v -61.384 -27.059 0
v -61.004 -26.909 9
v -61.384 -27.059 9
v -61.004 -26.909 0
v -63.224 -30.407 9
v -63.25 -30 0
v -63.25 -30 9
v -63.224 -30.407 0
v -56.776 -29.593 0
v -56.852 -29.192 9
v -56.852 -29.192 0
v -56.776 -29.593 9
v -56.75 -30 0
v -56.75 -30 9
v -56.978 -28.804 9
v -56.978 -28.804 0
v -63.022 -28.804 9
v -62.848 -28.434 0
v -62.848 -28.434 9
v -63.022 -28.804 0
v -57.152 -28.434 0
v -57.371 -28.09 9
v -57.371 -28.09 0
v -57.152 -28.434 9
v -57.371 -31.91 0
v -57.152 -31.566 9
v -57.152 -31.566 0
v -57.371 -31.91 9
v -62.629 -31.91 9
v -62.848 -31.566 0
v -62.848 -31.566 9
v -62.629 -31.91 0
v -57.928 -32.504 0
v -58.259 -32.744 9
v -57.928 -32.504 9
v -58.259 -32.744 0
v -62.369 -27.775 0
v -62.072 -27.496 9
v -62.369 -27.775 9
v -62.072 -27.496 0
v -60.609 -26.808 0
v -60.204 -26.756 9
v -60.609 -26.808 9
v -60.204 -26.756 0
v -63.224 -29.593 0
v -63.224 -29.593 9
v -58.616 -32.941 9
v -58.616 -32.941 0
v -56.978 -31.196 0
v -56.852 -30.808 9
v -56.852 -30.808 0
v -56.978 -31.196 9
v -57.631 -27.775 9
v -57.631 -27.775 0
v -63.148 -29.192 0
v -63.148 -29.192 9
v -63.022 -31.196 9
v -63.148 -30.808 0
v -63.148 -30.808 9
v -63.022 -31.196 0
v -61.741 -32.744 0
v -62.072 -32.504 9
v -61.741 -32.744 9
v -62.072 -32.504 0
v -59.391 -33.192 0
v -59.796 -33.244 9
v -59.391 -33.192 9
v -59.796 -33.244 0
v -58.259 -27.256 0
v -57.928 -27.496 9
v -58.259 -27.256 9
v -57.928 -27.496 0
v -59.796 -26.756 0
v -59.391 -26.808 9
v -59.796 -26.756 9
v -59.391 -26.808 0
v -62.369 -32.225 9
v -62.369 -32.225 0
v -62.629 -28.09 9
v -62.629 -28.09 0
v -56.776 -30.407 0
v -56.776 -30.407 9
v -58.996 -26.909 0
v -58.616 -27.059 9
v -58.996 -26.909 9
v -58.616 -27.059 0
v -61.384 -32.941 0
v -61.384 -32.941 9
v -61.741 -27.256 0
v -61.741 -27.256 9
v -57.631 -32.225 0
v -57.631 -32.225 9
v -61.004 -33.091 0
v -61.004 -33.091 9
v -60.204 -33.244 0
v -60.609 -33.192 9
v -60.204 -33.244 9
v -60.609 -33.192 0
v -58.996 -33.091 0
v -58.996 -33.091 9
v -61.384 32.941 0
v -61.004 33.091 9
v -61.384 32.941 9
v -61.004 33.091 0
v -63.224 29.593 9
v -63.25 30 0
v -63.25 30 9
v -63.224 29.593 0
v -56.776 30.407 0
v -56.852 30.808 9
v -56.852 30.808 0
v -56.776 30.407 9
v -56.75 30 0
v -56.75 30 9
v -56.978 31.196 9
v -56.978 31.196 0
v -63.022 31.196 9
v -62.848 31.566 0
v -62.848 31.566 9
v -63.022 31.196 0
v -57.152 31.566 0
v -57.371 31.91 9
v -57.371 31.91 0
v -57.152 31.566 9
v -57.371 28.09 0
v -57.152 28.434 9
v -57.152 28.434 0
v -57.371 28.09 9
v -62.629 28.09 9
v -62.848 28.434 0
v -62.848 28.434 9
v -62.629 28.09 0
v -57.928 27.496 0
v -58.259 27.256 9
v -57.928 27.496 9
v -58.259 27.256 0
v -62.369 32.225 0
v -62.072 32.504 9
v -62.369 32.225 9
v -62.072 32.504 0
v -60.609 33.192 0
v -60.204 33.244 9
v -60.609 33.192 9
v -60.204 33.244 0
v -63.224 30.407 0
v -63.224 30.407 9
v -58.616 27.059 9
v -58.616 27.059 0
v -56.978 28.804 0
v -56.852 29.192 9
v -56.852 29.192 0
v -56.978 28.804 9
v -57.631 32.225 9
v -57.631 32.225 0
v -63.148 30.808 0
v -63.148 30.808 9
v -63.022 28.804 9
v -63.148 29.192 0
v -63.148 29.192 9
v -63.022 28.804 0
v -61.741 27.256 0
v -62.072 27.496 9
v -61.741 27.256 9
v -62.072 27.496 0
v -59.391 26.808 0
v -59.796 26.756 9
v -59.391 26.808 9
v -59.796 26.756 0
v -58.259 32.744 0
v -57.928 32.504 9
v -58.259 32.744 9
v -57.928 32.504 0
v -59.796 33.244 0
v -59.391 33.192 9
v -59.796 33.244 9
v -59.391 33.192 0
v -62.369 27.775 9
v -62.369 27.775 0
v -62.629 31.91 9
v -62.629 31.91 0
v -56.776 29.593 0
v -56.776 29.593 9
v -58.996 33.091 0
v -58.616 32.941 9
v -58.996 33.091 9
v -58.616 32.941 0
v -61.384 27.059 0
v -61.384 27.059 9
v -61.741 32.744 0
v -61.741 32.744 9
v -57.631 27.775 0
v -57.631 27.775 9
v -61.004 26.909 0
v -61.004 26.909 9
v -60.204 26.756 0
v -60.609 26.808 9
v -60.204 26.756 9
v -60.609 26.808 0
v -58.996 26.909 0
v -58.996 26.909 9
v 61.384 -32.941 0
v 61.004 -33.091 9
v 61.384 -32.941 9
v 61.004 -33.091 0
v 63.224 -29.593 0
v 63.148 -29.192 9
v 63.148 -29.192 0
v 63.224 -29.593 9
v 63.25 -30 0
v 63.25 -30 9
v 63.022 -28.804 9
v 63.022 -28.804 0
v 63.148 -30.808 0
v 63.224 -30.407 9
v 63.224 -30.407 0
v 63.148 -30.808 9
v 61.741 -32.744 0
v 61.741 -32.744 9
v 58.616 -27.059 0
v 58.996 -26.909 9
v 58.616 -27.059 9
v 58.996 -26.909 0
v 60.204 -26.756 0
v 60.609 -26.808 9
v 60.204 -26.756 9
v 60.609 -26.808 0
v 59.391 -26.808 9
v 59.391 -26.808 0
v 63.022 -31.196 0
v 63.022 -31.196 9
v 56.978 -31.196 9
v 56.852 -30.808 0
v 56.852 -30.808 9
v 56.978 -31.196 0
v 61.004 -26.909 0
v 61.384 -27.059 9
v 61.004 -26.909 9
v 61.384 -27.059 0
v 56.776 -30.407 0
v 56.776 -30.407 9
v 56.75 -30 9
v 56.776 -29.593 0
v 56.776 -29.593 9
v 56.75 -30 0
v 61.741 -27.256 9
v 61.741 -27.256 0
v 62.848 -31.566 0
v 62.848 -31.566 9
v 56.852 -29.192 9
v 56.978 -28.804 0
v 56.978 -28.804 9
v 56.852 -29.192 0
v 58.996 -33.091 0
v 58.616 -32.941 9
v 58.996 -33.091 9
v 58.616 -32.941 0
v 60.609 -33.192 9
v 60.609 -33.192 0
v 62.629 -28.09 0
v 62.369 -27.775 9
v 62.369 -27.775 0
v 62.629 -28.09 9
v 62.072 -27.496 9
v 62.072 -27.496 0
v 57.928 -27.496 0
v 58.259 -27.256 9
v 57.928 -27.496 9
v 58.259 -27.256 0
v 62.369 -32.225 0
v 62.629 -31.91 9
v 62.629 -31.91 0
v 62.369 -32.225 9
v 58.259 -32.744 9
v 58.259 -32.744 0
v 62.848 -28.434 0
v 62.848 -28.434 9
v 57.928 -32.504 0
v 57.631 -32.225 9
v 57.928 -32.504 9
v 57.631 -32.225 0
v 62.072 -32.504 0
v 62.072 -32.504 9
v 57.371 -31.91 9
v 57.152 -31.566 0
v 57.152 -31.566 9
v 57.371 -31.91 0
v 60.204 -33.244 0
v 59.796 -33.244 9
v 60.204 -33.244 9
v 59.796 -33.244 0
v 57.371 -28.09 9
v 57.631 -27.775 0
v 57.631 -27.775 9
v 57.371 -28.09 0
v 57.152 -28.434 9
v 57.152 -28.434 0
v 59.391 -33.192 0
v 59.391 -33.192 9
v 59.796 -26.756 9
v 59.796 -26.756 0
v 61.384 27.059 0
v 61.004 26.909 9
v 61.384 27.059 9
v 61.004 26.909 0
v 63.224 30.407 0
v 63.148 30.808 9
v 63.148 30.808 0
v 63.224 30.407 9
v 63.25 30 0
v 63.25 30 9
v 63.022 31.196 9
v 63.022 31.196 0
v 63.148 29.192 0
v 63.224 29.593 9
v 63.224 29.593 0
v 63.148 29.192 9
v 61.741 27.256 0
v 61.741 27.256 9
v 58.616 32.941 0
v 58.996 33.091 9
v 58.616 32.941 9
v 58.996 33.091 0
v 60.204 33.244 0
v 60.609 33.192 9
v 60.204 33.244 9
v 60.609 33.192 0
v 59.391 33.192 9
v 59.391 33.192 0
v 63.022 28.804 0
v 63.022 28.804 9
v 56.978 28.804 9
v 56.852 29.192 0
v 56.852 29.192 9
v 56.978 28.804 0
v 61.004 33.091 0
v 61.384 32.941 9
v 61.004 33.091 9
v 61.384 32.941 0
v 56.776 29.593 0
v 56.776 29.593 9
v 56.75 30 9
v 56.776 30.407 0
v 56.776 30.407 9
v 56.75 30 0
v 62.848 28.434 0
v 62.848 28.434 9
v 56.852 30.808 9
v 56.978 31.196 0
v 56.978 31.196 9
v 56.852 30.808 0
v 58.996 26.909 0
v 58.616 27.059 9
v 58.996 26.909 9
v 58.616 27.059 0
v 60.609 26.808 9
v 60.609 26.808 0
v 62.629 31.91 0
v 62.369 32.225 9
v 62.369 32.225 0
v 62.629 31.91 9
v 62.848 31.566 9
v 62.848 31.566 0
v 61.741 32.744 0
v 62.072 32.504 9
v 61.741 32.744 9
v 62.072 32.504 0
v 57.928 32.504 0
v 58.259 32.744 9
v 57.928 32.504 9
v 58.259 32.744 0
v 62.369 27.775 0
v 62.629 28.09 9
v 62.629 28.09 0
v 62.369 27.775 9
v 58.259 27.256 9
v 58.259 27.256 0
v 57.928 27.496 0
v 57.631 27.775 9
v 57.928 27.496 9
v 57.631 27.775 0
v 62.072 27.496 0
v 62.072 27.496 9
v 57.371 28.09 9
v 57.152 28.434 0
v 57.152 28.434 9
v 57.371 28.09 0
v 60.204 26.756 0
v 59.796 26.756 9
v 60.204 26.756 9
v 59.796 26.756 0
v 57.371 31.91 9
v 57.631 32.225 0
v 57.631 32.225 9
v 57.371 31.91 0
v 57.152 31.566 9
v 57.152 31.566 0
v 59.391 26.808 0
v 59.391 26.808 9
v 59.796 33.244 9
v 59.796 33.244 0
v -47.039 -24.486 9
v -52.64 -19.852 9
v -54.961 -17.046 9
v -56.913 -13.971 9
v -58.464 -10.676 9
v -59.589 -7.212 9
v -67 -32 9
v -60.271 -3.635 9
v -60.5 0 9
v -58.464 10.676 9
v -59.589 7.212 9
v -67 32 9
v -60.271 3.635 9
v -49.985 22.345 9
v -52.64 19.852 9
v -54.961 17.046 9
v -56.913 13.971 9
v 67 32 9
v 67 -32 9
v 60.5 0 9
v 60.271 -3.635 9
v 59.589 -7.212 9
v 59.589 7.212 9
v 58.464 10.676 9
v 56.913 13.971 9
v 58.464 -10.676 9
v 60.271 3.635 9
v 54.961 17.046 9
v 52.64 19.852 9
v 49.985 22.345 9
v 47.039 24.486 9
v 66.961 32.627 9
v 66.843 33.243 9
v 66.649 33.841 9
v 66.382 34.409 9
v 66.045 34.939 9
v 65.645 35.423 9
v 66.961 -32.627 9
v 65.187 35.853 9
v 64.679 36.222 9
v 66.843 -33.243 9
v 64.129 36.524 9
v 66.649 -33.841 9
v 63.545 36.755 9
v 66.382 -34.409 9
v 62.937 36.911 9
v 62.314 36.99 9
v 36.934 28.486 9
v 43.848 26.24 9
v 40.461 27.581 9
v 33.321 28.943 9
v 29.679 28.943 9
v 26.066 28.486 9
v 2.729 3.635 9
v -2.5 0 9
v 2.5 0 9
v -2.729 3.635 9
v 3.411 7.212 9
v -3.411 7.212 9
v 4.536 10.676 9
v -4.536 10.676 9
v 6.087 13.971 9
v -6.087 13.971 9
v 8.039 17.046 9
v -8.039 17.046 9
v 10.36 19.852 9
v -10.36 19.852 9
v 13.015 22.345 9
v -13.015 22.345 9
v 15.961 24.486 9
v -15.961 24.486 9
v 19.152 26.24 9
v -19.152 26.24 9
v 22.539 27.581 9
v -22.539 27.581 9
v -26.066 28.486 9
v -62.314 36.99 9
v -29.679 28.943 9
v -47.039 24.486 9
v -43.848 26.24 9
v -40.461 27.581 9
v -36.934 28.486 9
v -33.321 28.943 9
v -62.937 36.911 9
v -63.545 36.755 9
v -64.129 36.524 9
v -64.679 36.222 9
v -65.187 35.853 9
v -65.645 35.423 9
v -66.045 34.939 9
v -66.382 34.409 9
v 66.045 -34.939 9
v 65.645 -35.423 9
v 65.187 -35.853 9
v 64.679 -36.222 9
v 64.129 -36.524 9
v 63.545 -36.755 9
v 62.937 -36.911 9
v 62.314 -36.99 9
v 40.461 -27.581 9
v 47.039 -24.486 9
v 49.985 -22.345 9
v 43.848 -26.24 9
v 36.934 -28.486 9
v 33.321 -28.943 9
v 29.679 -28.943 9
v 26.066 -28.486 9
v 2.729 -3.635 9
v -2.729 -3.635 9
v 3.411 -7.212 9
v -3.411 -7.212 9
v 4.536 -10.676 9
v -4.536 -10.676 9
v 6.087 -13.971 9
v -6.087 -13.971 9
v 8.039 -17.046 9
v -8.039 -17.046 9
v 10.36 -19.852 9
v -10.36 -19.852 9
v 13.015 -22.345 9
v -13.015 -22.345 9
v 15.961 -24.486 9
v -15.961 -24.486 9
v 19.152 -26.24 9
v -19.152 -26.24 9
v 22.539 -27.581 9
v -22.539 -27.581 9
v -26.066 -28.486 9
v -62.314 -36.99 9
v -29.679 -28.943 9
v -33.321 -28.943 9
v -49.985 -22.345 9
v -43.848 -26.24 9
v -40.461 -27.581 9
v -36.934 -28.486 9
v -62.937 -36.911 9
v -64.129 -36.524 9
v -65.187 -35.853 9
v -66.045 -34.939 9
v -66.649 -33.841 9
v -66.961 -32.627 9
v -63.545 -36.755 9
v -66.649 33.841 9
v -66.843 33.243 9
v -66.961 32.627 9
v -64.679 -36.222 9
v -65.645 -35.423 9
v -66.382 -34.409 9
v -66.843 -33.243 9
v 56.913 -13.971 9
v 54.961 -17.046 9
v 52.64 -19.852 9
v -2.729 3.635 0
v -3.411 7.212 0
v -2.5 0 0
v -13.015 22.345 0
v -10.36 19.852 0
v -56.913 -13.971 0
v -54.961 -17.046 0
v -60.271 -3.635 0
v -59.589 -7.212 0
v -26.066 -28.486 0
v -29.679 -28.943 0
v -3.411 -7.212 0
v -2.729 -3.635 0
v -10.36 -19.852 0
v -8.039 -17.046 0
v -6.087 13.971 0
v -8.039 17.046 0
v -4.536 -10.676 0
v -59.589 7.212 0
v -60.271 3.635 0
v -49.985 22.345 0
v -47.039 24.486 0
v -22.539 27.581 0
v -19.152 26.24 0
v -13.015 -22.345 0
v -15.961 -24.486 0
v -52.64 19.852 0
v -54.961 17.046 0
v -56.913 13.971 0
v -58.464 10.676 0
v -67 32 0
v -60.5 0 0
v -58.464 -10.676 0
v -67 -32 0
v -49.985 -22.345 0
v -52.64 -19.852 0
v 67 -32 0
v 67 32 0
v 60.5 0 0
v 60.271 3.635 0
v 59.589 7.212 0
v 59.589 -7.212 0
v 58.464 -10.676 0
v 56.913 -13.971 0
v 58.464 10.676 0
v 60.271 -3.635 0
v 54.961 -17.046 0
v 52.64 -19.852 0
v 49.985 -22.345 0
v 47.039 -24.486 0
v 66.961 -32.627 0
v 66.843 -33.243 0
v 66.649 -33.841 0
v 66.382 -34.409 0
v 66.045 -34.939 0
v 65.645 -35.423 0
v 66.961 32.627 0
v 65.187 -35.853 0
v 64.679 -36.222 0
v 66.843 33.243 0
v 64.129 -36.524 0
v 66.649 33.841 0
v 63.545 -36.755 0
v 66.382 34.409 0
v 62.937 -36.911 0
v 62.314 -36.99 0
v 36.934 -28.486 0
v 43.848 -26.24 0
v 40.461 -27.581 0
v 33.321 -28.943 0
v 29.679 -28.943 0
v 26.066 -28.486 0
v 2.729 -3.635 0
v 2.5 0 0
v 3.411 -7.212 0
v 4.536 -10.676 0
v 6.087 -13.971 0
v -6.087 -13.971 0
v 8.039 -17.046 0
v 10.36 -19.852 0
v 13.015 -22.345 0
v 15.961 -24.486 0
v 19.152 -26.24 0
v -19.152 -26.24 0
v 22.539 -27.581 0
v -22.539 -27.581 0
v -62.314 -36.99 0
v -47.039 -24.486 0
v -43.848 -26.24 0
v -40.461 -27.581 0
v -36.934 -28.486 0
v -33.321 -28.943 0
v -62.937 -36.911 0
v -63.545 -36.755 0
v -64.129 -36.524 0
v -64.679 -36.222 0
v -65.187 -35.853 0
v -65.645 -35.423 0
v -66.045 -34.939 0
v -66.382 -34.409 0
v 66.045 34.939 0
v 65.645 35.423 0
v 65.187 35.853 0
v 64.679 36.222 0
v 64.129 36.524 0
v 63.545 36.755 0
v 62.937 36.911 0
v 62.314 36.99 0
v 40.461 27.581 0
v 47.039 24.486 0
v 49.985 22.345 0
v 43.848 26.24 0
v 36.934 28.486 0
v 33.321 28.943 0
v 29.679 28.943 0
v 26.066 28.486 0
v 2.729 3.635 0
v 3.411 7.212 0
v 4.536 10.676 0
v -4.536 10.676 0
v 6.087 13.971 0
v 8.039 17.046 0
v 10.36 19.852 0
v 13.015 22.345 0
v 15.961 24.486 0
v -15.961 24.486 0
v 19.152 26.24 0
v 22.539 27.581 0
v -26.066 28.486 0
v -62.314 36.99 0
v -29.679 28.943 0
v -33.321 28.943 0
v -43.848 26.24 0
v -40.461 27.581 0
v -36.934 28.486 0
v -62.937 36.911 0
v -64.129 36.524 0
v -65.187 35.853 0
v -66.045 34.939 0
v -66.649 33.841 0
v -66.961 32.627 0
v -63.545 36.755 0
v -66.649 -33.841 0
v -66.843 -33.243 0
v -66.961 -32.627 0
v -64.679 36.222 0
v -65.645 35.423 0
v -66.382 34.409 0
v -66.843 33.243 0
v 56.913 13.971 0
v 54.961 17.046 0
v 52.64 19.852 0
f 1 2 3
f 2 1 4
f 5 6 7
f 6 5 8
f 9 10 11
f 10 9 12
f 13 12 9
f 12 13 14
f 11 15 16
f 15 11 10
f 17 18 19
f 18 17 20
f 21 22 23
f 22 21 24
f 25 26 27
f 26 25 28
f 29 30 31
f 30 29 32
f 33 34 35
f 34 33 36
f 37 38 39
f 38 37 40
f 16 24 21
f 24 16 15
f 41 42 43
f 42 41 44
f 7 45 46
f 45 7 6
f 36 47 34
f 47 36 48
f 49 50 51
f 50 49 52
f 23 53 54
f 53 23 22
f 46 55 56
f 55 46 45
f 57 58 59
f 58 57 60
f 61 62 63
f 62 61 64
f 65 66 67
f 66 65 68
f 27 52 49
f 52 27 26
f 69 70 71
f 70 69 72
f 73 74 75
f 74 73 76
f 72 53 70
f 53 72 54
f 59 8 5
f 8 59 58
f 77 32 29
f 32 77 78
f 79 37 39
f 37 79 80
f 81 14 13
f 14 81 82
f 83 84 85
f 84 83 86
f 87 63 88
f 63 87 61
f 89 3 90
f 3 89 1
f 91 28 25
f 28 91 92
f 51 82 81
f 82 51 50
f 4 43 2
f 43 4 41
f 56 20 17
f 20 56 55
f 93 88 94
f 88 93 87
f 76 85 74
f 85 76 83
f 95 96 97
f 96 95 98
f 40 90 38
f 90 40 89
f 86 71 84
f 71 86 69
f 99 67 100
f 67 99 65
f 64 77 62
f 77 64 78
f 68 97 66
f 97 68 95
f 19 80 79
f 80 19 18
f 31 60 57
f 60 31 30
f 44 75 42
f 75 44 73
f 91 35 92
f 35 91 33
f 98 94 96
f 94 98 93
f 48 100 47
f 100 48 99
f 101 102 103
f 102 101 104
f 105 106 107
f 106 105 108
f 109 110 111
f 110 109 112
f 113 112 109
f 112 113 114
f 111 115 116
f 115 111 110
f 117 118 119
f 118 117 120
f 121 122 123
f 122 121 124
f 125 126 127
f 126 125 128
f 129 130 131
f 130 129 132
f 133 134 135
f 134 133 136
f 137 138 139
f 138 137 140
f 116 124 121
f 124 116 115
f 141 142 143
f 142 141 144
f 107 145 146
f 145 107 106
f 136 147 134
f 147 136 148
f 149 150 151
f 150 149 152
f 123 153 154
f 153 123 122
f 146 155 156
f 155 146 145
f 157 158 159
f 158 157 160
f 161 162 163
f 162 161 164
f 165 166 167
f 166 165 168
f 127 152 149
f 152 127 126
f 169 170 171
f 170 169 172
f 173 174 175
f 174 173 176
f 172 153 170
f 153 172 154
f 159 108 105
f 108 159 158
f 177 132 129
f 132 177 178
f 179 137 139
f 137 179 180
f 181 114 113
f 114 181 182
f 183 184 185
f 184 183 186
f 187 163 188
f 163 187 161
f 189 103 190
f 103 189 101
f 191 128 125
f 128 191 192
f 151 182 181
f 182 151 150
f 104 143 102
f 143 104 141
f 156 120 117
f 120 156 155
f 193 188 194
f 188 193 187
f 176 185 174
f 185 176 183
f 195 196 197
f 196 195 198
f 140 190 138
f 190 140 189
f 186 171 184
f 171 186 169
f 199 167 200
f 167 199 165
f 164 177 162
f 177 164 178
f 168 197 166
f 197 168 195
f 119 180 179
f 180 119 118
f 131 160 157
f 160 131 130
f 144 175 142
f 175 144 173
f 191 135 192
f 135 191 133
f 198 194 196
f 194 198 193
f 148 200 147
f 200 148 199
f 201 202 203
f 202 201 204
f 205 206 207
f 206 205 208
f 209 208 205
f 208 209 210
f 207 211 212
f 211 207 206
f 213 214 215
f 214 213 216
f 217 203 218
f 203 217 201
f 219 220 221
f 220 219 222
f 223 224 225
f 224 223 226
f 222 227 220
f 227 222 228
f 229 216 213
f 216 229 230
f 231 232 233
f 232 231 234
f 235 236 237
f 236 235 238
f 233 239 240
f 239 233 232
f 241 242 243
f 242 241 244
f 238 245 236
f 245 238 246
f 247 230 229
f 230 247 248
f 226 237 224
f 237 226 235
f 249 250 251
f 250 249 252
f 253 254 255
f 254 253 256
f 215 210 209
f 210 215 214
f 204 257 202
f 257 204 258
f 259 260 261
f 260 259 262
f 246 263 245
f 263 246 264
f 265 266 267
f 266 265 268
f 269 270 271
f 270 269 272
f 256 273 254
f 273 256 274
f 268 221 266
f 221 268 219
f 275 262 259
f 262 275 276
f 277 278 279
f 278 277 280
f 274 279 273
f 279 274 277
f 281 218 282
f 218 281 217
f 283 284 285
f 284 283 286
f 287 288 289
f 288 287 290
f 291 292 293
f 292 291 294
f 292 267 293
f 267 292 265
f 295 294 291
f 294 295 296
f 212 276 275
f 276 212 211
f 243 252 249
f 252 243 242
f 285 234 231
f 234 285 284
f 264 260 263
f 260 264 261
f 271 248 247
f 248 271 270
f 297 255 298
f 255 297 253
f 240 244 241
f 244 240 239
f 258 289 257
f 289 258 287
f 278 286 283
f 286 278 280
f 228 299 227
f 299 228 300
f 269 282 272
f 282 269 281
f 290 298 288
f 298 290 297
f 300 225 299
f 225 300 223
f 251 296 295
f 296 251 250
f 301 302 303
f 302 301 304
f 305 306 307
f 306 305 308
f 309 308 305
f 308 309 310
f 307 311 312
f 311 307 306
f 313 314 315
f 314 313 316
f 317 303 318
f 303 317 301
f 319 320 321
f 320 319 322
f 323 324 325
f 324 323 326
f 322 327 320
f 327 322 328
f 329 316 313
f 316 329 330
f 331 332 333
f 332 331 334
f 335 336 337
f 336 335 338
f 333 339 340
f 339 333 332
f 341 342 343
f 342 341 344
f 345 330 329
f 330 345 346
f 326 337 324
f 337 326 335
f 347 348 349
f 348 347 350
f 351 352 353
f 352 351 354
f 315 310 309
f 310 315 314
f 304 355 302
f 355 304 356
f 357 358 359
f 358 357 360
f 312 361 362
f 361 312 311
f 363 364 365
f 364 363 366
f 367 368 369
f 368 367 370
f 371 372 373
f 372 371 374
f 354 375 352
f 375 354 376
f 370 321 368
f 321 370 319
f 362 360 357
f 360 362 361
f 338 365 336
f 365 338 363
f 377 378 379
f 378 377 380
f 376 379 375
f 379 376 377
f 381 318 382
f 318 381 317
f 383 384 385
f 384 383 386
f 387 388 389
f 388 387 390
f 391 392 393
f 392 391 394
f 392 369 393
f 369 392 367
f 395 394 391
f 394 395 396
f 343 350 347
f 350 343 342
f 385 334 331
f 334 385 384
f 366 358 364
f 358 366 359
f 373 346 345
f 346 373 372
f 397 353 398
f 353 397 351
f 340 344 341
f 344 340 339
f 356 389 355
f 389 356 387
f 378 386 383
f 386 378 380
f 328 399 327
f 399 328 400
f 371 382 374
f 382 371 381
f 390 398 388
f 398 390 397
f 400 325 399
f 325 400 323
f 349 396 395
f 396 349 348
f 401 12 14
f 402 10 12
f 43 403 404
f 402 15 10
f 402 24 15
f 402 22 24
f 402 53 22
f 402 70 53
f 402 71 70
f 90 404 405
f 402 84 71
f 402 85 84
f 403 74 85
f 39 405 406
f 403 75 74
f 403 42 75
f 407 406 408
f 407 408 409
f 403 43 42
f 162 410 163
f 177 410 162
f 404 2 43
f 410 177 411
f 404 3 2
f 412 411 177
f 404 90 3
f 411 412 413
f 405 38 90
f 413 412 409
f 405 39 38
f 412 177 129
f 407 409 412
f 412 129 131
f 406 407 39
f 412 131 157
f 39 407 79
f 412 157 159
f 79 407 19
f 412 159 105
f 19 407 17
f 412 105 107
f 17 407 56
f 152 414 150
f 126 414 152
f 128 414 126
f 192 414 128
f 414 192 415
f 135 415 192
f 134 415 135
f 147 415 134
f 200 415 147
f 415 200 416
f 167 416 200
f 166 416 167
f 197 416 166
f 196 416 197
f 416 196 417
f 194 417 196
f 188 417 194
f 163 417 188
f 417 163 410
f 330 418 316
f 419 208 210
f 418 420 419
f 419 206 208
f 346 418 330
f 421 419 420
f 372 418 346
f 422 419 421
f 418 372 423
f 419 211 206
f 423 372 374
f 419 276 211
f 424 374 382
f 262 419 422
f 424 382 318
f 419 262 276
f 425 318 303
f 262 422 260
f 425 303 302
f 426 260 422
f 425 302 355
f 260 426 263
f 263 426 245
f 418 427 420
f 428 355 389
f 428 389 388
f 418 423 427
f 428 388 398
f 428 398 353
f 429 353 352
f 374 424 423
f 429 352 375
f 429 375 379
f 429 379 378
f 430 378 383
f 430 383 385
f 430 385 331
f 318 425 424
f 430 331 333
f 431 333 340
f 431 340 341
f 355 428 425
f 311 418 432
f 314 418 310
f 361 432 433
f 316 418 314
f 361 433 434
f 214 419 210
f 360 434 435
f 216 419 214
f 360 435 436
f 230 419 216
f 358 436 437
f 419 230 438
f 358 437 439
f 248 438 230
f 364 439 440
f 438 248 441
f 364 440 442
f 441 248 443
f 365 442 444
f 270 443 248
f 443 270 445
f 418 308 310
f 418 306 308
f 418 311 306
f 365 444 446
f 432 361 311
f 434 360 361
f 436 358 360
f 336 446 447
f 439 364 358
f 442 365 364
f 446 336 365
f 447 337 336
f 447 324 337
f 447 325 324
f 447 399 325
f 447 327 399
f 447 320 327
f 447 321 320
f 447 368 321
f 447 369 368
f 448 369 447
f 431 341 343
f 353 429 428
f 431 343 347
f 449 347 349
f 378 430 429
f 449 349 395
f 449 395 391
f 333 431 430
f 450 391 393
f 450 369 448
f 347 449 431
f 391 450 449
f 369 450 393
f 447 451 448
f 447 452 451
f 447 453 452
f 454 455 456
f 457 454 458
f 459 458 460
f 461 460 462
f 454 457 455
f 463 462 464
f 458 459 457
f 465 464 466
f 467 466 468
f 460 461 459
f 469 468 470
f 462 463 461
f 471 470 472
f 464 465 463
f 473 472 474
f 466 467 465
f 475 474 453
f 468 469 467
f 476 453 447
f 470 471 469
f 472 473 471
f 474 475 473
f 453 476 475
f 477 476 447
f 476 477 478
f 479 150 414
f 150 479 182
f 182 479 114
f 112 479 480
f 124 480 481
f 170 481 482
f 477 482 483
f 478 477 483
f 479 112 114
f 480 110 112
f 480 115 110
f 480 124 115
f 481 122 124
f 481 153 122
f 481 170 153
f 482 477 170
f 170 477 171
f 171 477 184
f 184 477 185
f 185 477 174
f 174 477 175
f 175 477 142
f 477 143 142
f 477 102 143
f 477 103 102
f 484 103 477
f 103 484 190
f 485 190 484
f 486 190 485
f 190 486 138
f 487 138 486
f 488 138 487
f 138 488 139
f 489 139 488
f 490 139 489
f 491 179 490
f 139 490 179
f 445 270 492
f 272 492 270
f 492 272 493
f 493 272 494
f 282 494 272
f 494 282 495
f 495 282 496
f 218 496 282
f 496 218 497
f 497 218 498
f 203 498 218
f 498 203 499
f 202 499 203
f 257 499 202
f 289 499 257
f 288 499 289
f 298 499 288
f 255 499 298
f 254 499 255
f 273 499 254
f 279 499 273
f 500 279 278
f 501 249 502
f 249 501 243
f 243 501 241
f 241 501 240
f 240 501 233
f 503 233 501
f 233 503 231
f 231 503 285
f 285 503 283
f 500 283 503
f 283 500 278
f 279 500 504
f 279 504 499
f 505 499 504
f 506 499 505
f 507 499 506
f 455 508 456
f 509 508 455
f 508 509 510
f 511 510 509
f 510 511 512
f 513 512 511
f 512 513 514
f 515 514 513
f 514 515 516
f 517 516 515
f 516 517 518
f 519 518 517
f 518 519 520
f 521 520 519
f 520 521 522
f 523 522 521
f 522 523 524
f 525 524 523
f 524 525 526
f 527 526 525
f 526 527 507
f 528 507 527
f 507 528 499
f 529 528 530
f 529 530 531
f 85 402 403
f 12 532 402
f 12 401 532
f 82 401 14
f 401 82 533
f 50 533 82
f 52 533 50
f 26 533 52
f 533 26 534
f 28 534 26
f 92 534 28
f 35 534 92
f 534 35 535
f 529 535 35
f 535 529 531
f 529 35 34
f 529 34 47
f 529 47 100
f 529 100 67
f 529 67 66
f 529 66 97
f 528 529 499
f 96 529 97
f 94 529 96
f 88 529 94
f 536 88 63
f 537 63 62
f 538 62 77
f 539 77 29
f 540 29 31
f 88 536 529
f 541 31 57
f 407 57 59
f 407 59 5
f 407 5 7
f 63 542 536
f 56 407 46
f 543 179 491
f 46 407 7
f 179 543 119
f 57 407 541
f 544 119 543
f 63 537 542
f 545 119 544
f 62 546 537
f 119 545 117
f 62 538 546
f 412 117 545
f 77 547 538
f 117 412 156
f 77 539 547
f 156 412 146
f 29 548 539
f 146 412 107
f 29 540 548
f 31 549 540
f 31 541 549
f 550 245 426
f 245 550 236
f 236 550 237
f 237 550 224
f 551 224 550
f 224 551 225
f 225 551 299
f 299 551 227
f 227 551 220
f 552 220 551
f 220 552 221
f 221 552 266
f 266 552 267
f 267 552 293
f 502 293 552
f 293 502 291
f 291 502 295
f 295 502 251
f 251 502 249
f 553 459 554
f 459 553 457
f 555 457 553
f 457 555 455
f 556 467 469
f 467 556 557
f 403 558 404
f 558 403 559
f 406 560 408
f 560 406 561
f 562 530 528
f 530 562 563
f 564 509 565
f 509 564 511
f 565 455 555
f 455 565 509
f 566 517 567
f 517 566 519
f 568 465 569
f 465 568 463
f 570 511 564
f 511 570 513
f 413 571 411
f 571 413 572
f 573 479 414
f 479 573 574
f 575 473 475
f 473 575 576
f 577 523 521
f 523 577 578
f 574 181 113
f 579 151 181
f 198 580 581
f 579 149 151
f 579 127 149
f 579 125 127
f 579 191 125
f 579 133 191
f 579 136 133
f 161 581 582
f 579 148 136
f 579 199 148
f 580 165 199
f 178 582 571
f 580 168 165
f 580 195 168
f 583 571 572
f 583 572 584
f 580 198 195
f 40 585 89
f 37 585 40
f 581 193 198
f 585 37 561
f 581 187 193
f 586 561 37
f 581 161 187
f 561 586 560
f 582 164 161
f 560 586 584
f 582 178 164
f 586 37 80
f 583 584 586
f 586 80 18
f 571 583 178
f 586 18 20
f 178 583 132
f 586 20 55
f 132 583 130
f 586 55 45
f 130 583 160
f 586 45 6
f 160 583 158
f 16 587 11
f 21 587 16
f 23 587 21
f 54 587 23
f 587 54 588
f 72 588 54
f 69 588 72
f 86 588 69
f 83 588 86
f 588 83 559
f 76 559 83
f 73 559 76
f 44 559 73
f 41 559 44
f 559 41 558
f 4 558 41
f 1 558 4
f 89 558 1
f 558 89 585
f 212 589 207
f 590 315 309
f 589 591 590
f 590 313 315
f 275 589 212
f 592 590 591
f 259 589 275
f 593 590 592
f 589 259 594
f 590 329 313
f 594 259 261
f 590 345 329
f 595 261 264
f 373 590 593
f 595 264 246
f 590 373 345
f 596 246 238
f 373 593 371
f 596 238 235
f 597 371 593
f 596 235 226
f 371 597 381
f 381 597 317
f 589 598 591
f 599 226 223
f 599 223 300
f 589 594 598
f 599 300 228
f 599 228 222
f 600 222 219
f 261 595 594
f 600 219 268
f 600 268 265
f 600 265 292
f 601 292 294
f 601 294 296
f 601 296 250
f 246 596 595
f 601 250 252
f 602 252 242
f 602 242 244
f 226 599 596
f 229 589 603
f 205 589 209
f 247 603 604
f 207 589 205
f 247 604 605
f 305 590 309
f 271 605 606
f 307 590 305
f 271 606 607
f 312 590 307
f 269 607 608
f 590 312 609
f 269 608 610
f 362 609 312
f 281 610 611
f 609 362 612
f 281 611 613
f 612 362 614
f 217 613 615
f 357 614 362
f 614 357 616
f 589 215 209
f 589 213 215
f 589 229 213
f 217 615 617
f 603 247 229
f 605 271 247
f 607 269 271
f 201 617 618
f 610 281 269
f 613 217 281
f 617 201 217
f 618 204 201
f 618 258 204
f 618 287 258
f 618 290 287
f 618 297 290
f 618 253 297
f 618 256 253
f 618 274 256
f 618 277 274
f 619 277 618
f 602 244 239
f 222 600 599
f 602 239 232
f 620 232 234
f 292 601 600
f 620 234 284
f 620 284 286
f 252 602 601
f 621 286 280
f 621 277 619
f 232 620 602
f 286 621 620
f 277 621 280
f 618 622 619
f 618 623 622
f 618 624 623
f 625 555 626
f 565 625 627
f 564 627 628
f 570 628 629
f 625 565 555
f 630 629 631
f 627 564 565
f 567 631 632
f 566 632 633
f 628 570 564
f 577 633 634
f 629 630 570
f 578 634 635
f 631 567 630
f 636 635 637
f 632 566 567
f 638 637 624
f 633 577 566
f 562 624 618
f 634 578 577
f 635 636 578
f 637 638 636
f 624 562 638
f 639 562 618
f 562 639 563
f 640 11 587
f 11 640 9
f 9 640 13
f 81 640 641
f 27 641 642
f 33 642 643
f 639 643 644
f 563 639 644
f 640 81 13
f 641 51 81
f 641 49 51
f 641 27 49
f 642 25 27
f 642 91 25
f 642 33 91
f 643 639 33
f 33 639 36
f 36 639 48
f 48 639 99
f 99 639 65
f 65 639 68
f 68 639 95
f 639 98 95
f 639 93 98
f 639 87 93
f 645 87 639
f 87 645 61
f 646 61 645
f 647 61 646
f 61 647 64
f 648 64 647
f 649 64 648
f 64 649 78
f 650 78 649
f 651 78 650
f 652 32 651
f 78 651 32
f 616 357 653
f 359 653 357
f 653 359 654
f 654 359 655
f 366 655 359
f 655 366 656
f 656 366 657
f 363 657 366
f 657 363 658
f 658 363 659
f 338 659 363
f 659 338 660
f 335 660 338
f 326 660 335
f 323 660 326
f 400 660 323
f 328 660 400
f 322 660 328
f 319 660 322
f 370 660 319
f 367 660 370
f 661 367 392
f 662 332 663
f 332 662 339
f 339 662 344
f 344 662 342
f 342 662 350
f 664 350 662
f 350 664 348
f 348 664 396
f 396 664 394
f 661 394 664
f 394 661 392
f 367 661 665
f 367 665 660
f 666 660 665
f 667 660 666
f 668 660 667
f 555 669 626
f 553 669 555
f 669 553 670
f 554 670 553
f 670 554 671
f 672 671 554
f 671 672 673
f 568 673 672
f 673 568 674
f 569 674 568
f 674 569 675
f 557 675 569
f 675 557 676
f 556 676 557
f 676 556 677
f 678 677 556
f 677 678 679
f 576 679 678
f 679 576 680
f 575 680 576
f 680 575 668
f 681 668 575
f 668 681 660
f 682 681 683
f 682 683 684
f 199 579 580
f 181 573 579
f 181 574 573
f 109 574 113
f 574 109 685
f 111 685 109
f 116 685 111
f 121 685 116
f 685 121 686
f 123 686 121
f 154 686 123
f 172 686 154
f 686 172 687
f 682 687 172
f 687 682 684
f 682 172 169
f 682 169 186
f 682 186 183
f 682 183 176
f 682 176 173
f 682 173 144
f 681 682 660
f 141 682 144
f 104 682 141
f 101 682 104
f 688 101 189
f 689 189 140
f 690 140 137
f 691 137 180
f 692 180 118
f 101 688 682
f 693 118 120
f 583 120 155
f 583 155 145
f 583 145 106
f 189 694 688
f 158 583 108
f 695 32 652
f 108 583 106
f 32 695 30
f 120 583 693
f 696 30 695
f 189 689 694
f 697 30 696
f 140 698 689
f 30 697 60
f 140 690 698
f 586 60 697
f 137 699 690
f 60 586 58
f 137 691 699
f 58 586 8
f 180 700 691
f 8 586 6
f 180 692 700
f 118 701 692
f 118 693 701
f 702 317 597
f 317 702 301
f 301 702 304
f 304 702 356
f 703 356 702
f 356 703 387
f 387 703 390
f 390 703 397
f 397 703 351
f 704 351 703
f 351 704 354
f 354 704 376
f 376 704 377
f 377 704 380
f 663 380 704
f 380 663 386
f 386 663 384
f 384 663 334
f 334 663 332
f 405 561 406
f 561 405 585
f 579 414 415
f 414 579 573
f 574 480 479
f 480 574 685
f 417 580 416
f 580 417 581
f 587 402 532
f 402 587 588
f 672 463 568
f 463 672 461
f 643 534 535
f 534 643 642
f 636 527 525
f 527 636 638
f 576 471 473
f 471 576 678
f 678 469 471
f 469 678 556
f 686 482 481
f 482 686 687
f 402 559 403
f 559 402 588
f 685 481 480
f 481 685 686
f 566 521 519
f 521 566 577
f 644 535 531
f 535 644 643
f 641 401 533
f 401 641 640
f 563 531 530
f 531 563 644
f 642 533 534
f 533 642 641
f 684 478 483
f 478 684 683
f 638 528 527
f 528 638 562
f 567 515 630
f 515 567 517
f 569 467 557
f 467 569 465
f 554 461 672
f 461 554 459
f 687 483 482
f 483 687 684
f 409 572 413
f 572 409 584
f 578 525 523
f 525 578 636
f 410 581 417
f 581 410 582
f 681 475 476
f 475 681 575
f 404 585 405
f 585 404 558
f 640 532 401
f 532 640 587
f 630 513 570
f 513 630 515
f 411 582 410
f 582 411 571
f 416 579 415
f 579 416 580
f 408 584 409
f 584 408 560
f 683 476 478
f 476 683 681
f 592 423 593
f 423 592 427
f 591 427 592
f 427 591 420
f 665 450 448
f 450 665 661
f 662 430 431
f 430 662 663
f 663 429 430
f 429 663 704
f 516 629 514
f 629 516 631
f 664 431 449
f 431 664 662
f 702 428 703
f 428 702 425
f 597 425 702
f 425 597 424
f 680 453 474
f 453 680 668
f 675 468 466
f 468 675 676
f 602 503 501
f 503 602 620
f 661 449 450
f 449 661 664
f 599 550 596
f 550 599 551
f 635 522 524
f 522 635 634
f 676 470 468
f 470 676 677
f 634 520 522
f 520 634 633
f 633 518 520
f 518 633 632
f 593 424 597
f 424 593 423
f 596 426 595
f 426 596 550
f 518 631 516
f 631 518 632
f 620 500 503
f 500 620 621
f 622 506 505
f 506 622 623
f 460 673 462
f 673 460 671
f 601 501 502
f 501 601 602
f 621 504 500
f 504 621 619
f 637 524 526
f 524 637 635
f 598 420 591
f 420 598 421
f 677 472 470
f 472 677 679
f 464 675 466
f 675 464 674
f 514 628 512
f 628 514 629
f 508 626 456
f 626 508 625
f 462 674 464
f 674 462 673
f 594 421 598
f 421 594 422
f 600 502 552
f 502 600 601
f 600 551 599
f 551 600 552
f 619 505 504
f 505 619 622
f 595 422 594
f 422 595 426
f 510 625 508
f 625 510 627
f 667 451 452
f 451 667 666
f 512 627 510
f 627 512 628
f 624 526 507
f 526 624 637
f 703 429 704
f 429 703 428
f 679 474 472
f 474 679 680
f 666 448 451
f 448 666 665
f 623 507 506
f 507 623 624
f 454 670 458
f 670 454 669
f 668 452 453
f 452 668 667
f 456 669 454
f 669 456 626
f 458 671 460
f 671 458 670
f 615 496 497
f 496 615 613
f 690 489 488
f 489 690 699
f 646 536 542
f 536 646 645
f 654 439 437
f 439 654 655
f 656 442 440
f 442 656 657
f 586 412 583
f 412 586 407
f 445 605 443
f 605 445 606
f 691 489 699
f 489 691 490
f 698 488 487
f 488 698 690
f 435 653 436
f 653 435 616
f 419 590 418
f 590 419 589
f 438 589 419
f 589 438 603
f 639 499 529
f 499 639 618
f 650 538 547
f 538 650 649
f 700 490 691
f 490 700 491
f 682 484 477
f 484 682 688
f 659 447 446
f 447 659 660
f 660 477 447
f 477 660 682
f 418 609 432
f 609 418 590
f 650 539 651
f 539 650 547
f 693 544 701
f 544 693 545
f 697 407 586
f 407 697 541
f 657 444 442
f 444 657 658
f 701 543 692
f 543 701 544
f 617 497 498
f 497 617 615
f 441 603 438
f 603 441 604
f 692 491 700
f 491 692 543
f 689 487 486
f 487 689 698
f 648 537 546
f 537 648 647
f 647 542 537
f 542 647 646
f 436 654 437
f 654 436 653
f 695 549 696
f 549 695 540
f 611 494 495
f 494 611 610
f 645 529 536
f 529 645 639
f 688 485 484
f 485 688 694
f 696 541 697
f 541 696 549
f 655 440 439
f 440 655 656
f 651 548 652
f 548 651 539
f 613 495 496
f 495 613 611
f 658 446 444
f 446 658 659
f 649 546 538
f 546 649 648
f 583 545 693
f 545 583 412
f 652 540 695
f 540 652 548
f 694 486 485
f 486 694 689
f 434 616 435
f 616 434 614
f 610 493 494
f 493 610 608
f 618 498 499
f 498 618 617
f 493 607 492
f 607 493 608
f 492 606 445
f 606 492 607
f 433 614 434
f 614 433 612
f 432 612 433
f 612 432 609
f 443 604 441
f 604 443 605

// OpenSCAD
$fn = 50;

difference() {
	union() {
		hull() {
			translate(v = [-62.0, 32.0, 0]) {
				cylinder(h = 9, r = 5);
			}
			translate(v = [62.0, 32.0, 0]) {
				cylinder(h = 9, r = 5);
			}
			translate(v = [-62.0, -32.0, 0]) {
				cylinder(h = 9, r = 5);
			}
			translate(v = [62.0, -32.0, 0]) {
				cylinder(h = 9, r = 5);
			}
		}
	}
	union() {
		translate(v = [-60.0, -30.0, -100.0]) {
			cylinder(h = 200, r = 3.25);
		}
		translate(v = [-60.0, 30.0, -100.0]) {
			cylinder(h = 200, r = 3.25);
		}
		translate(v = [60.0, -30.0, -100.0]) {
			cylinder(h = 200, r = 3.25);
		}
		translate(v = [60.0, 30.0, -100.0]) {
			cylinder(h = 200, r = 3.25);
		}
		translate(v = [-60.0, -30.0, -100.0]) {
			cylinder(h = 200, r = 1.8);
		}
		translate(v = [-60.0, 30.0, -100.0]) {
			cylinder(h = 200, r = 1.8);
		}
		translate(v = [60.0, -30.0, -100.0]) {
			cylinder(h = 200, r = 1.8);
		}
		translate(v = [60.0, 30.0, -100.0]) {
			cylinder(h = 200, r = 1.8);
		}
		translate(v = [-31.5, 0, 0.0]) {
			cylinder(h = 9, r = 29.0);
		}
		translate(v = [31.5, 0, 0.0]) {
			cylinder(h = 9, r = 29.0);
		}
	}
}
